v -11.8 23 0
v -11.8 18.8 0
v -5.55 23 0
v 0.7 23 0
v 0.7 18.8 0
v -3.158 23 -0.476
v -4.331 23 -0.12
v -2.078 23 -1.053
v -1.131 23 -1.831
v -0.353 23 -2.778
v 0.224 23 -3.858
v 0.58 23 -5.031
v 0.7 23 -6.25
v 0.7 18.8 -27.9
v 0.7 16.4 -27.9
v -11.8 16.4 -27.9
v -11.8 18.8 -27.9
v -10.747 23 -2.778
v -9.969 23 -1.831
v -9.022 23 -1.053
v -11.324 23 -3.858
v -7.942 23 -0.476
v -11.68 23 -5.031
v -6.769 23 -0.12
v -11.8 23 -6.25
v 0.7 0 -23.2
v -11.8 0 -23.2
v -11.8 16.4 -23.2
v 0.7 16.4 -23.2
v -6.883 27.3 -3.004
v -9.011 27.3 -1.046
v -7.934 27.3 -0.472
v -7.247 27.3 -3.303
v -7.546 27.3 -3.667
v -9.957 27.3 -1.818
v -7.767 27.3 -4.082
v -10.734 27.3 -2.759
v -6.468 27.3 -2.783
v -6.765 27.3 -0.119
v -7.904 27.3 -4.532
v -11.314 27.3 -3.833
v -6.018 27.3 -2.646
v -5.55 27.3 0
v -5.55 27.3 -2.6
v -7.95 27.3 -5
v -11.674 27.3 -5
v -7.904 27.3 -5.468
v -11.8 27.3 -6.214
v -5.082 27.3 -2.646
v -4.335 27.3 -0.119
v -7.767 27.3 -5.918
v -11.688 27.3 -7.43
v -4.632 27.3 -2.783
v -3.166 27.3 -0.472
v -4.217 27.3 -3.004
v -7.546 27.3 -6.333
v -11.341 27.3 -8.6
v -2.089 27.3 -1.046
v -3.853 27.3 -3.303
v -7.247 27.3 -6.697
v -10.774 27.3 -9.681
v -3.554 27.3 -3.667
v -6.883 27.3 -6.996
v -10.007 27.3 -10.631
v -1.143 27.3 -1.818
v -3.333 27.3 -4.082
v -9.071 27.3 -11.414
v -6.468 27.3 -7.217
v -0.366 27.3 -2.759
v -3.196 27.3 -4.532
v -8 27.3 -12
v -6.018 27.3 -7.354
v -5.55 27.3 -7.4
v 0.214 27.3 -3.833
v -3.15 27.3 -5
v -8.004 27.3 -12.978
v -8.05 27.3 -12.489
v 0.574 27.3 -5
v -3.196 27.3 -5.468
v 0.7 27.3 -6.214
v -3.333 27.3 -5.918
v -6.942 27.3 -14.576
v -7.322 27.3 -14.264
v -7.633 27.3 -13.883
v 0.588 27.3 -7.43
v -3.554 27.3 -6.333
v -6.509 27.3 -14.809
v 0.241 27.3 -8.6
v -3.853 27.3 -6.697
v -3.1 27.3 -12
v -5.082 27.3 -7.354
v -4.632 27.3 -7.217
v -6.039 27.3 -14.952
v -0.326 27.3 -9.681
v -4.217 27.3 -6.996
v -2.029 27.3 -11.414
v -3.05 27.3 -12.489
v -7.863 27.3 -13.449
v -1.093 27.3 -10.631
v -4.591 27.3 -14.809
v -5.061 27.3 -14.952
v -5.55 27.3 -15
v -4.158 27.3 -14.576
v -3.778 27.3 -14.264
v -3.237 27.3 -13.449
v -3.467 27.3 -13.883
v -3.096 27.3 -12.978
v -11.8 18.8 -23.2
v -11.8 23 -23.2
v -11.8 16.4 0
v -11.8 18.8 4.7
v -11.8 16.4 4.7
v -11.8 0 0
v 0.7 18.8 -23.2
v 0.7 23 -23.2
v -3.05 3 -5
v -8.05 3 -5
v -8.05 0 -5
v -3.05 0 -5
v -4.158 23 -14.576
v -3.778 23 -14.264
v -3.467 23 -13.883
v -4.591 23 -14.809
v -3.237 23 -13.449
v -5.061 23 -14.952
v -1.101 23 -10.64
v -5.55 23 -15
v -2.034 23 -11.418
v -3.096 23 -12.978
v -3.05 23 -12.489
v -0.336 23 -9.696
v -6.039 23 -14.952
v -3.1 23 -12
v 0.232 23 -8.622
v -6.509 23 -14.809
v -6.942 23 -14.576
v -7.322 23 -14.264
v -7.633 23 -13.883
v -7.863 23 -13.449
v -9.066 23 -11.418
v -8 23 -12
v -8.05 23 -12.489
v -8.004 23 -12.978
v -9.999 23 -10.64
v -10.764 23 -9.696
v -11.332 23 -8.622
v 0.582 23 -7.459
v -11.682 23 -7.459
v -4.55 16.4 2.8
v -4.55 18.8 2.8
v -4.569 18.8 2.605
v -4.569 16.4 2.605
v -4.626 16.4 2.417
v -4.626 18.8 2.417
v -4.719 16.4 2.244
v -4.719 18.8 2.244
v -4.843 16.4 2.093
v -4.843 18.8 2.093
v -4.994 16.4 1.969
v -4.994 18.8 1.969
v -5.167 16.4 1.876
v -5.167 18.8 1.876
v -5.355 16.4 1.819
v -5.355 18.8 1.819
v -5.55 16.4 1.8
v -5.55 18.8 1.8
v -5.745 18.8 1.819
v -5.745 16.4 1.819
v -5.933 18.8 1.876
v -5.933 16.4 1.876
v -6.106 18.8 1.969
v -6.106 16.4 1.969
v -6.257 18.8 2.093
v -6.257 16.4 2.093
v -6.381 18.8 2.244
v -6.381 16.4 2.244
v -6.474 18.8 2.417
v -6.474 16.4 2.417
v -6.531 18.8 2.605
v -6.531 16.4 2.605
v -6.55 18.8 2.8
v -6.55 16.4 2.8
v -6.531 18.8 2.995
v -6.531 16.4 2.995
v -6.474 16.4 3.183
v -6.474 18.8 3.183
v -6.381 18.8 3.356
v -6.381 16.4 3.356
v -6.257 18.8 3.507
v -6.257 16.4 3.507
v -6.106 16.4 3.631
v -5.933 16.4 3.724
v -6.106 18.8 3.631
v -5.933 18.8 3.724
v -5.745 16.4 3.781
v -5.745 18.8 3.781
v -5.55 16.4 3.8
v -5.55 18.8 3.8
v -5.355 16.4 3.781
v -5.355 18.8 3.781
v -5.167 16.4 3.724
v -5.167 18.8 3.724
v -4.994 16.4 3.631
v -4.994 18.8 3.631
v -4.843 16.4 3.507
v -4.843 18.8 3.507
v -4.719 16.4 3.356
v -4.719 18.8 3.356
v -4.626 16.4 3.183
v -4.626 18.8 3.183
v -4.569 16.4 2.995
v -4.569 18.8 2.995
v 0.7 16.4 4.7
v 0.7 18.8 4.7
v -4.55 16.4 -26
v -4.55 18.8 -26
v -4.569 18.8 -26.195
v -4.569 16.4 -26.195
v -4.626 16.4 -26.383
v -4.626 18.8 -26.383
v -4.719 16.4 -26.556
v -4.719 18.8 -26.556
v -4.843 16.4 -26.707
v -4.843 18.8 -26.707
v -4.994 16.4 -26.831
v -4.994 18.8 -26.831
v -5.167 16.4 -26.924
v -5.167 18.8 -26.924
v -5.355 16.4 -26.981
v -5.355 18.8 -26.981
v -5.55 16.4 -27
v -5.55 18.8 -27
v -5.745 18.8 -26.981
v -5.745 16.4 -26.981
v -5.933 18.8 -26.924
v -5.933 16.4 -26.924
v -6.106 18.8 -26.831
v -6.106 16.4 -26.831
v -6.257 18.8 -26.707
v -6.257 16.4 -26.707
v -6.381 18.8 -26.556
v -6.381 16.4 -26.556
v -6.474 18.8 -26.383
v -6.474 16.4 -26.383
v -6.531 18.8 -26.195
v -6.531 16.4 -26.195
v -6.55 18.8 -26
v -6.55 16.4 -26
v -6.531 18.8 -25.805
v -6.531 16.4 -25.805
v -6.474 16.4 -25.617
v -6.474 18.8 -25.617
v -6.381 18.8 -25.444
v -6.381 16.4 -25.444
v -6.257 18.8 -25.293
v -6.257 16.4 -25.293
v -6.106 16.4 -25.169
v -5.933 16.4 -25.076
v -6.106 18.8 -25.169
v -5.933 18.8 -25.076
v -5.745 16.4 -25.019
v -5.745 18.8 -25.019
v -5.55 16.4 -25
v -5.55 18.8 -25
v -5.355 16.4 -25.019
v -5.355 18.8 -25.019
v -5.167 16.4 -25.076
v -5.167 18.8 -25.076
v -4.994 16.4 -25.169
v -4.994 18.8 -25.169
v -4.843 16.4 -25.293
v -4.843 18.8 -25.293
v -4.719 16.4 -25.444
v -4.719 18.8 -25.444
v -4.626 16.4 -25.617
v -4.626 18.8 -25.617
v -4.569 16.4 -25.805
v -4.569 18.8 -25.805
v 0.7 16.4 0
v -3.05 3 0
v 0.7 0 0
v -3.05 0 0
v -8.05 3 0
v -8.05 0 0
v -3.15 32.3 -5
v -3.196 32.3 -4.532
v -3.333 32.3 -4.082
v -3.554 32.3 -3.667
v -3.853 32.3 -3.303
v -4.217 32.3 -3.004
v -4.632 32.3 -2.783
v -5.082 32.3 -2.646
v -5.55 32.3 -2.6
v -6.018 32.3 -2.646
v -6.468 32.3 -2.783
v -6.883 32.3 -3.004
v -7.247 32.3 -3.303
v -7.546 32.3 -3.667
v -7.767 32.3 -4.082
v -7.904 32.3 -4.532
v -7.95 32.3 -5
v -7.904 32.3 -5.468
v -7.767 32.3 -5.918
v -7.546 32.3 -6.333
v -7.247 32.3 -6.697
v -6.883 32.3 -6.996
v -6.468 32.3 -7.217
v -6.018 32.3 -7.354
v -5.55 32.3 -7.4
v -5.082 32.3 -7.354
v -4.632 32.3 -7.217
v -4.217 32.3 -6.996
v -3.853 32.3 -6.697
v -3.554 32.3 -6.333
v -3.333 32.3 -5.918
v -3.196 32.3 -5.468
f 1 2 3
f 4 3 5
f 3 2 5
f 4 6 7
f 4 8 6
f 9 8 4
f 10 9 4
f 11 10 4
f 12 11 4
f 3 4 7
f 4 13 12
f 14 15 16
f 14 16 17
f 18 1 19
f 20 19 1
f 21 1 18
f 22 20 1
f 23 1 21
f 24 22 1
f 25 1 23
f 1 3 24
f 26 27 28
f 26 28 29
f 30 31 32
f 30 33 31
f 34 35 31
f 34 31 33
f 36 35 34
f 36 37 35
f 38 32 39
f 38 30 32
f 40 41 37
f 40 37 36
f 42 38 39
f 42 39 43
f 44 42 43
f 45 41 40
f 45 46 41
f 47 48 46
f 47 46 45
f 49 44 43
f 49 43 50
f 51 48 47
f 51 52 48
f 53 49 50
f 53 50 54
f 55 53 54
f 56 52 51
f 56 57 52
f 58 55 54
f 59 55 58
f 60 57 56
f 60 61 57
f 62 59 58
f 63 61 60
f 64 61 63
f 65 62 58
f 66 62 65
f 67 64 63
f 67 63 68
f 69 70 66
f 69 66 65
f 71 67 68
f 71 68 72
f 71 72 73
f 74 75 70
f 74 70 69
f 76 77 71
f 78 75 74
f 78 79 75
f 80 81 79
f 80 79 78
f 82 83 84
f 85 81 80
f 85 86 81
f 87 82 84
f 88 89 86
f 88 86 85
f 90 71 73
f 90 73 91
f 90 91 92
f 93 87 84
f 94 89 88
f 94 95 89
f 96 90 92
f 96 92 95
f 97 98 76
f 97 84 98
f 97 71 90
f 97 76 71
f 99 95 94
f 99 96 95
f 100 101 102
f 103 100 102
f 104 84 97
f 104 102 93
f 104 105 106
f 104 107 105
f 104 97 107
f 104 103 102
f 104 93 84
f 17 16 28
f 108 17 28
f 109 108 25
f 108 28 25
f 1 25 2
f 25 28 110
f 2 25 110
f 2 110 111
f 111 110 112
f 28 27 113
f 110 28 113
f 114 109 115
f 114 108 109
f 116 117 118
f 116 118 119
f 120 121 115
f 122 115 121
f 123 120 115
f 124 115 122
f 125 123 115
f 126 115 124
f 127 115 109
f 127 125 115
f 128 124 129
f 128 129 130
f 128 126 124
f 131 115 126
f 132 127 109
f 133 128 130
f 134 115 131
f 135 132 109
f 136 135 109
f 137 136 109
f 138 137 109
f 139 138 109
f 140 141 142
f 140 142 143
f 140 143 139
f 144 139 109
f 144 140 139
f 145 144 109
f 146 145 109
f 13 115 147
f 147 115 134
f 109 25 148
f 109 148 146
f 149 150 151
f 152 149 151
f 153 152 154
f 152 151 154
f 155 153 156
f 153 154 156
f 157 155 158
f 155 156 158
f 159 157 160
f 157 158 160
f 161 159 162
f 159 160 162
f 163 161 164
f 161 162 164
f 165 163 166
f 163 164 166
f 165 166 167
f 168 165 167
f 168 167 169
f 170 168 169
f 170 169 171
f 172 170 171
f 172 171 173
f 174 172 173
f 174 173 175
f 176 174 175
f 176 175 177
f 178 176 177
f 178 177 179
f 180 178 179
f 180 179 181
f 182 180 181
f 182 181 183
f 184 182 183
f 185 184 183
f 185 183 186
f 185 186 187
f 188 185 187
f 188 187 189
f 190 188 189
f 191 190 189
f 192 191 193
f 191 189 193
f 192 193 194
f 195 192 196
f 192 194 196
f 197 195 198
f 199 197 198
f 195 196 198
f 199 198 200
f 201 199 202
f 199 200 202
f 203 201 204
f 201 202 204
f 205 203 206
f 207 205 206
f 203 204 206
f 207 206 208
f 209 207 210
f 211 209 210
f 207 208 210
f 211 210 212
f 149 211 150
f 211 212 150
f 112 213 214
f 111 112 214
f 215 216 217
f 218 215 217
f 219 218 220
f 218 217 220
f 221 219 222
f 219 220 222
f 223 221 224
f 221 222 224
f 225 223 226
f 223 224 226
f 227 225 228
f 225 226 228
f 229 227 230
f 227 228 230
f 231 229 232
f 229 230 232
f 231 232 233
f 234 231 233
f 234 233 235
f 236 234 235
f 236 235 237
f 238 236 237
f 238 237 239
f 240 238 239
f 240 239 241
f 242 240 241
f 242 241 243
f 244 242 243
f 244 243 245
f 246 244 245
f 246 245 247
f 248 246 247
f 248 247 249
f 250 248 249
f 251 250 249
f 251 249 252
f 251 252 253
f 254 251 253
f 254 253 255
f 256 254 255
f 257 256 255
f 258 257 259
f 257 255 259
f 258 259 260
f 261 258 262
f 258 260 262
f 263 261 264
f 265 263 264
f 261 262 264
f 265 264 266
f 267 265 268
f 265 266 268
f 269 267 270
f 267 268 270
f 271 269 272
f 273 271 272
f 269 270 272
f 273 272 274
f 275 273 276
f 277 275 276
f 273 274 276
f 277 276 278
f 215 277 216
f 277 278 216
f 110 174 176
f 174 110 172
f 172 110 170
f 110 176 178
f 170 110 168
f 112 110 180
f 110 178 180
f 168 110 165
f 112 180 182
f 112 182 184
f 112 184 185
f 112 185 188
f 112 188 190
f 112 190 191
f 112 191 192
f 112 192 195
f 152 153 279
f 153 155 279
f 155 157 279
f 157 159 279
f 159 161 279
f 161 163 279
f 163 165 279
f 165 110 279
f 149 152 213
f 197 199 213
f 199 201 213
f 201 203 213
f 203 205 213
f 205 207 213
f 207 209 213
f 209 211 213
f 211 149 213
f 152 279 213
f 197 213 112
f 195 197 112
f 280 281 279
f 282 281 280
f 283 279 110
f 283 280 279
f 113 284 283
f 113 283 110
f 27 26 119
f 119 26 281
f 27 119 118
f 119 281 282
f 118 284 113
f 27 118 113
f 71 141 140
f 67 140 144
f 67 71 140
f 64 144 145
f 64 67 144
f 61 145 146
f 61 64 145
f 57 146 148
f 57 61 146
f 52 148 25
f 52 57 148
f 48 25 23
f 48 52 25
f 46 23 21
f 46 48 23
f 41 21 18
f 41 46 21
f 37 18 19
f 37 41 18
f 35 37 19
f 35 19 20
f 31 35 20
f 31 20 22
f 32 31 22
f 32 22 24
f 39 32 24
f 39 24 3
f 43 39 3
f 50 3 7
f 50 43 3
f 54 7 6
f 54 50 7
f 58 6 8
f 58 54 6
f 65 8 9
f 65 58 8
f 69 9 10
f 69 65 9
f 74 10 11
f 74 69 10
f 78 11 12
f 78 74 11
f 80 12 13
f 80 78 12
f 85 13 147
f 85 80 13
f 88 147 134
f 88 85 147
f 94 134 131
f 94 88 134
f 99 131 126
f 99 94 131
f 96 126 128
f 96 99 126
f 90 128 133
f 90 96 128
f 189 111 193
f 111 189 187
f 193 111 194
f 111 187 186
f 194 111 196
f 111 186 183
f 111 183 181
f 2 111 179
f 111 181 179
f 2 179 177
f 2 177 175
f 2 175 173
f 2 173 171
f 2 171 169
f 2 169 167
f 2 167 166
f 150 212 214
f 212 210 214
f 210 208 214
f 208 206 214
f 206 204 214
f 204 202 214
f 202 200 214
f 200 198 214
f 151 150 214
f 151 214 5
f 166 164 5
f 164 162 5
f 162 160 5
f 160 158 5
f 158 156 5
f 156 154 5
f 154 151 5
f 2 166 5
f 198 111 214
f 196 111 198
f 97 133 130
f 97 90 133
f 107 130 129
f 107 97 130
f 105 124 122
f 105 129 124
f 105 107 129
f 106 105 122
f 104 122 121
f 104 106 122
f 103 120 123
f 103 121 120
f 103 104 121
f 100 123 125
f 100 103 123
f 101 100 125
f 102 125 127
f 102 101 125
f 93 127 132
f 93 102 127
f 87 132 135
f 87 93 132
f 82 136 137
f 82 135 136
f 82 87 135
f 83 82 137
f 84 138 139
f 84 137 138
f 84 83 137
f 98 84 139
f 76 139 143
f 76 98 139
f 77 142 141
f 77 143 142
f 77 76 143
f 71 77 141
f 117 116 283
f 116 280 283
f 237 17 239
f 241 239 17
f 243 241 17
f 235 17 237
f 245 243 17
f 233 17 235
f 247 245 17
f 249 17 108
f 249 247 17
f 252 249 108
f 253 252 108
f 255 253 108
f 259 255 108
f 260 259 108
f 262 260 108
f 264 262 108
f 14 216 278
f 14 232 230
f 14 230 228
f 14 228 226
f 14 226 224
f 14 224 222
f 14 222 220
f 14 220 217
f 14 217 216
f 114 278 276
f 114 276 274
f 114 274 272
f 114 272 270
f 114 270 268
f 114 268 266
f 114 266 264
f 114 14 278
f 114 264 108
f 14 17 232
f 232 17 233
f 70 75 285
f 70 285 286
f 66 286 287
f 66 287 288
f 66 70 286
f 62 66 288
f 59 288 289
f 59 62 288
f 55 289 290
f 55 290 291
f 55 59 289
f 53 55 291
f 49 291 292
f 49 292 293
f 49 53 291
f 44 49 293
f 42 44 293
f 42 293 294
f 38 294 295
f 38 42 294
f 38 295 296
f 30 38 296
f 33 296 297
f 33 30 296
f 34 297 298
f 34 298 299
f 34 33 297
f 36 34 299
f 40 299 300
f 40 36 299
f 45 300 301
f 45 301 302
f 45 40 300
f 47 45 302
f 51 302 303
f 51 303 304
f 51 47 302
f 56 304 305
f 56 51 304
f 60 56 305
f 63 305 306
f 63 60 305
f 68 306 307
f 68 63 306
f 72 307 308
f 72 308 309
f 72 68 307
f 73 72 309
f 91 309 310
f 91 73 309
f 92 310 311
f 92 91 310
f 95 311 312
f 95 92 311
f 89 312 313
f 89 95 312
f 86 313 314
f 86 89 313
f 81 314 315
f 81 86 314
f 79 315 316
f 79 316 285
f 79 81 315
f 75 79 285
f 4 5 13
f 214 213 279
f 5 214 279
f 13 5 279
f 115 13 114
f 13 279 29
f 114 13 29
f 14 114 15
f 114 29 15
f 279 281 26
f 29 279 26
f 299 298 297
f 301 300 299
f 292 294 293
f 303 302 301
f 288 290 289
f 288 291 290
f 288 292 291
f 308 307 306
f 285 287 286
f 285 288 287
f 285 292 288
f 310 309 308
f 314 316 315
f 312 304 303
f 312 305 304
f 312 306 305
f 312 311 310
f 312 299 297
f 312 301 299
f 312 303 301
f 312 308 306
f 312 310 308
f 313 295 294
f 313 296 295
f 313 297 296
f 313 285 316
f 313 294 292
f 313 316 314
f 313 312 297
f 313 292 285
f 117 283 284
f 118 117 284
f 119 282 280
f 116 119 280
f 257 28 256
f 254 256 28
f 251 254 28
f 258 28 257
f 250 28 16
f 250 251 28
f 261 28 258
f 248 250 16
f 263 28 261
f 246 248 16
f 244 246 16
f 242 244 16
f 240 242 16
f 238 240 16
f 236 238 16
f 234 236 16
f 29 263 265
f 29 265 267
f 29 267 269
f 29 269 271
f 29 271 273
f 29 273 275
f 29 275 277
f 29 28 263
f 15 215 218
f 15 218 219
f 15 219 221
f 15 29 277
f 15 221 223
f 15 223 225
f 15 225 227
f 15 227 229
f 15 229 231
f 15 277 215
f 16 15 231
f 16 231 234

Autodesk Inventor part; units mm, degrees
ref_plane "YZ Plane" through (0, 0, 0) normal (1, 0, 0) x (0, 1, 0)
ref_plane "XZ Plane" through (0, 0, 0) normal (0, 1, 0) x (-1, 0, 0)
ref_plane "XY Plane" through (0, 0, 0) normal (0, 0, 1) x (1, 0, 0)
sketch "Boceto1" plane through (0, 0, 0) normal (0, 1, 0) x (-1, 0, 0)
  line L0 (0, 0) -> (11.8, 0)
  line L1 (11.8, 0) -> (11.8, -23.2)
  line L2 (11.8, -23.2) -> (0, -23.2)
  line L3 (0, -23.2) -> (0, 0)
  dimension "d0" = 11.8
  dimension "d1" = 23.2
extrude "Extrusión1" add sketch "Boceto1" along normal blind 23
sketch "Boceto2" plane through (0, 0, 0) normal (1, 0, 0) x (0, 0, -1)
  line L0 (0, 0) -> (0, 23) projected
  line L1 (0, 0) -> (0, 16.4)
  line L2 (0, 16.4) -> (-4.7, 16.4)
  line L3 (-4.7, 16.4) -> (-4.7, 18.8)
  line L4 (-4.7, 18.8) -> (0, 18.8)
  line L5 (23.2, 0) -> (23.2, 23) projected
  line L6 (23.2, 16.4) -> (27.9, 16.4)
  line L7 (27.9, 16.4) -> (27.9, 18.8)
  line L8 (27.9, 18.8) -> (23.2, 18.8)
  line L9 (0, 18.8) -> (0, 16.4)
  line L10 (23.2, 18.8) -> (23.2, 16.4)
  dimension "d4" = 16.4
  dimension "d5" = 4.7
  dimension "d6" = 2.4
  dimension "d7" = 4.7
extrude "Extrusión2" add sketch "Boceto2" against normal blind 11.8
move faces "Desplazar1" translate (0.7, 0, 0) faces at (0, 5.4667, -15.4667)
sketch "Boceto4" plane through (-11.8, 18.8, 4.7) normal (0, 1, 0) x (1, 0, 0)
  line L0 (12.5, 0) -> (12.5, 4.7) projected
  line L1 (0, 0) -> (12.5, 0)
  line L2 (12.5, 0) -> (0, 0) projected
  line L3 (6.25, 0) -> (6.25, 1.9)
  line L4 (0, 32.6) -> (0, 27.9) projected
  line L5 (12.5, 32.6) -> (0, 32.6) projected
  line L6 (0, 32.6) -> (12.5, 32.6)
  line L7 (6.25, 32.6) -> (6.25, 30.7)
  circle A0 centre (6.25, 1.9) radius 1
  circle A1 centre (6.25, 30.7) radius 1
  point P0 (11.8, 4.7)
  dimension "d13" = 1.9
  dimension "d14" = 1.9
  dimension "d15" = 2
  dimension "d16" = 2
extrude "Extrusión3" cut sketch "Boceto4" against normal blind 2.4
sketch "Boceto5" plane through (0, 23, 0) normal (0, 1, 0) x (1, 0, 0)
  line L0 (-11.8, 23.2) -> (-11.8, 0) projected
  line L1 (-11.8, 0) -> (0.7, 0) projected
  line L2 (-11.8, 0) -> (0.7, 0)
  line L3 (0.7, 0) -> (0.7, 15)
  line L4 (0.7, 0) -> (0.7, 23.2) projected
  line L5 (0.7, 15) -> (-11.8, 15)
  line L6 (-11.8, 15) -> (-11.8, 0)
  point P0 (0, 0)
  dimension "d19" = 15
extrude "Extrusión4" add sketch "Boceto5" along normal blind 4.3
sketch "Boceto6" plane through (0, 27.3, 0) normal (0, 1, 0) x (1, 0, 0)
  line L0 (-11.8, 0) -> (0.7, 0) projected
  line L1 (-5.55, 0) -> (-5.55, 5)
  circle A0 centre (-5.55, 5) radius 2.4
  point P0 (0, 0)
  dimension "d22" = 5
  dimension "d23" = 4.8
extrude "Extrusión5" add sketch "Boceto6" along normal blind 5
sketch "Boceto7" plane through (0, 27.3, 0) normal (0, 1, 0) x (1, 0, 0)
  line L0 (-11.8, 0) -> (0.7, 0) projected
  line L1 (-5.55, 0) -> (-5.55, 6.25)
  arc A0 (-7.9995, 12) -> (-3.1005, 12) centre (-5.55, 6.25) ccw
  line L2 (0.7, 15) -> (-11.8, 15) projected
  arc A1 (-3.1005, 12) -> (-7.9995, 12) centre (-5.55, 12.5) ccw
  line L3 (0.7, 0) -> (-11.8, 0)
  line L4 (-11.8, 15) -> (-11.8, 0) projected
  line L5 (-11.8, 0) -> (-11.8, 15)
  line L6 (-11.8, 15) -> (0.7, 15)
  line L7 (0.7, 23.2) -> (0.7, 0) projected
  line L8 (0.7, 0) -> (0.7, 15)
  point P0 (0, 0)
  dimension "d26" = 6.25
extrude "Extrusión6" cut sketch "Boceto7" against normal blind 4.3 contours L4 A0 L0 | A0 L7 L0 | L4 L2 A1 A0 | A0 A1 L2 L7
sketch "Boceto9" plane through (-11.8, 0, 0) normal (0, 0, 1) x (1, 0, 0)
  line L0 (12.5, 0) -> (0, 0) projected
  line L1 (12.5, 0) -> (6.25, 0)
  line L2 (6.25, 0) -> (6.25, 3)
  line L3 (8.75, 3) -> (3.75, 3) projected
  line L4 (6.25, 3) -> (8.75, 3)
  line L5 (8.75, 0) -> (8.75, 3) projected
  line L6 (8.75, 3) -> (8.75, 0)
  line L7 (6.25, 3) -> (3.75, 3)
  line L8 (3.75, 3) -> (3.75, 0) projected
  line L9 (3.75, 3) -> (3.75, 0)
  line L10 (3.75, 0) -> (6.25, 0)
  point P0 (11.8, 0)
  dimension "d35" = 3
  dimension "d36" = 2.5
extrude "Extrusión8" cut sketch "Boceto9" against normal blind 5
properties part number "microservo_FT"
